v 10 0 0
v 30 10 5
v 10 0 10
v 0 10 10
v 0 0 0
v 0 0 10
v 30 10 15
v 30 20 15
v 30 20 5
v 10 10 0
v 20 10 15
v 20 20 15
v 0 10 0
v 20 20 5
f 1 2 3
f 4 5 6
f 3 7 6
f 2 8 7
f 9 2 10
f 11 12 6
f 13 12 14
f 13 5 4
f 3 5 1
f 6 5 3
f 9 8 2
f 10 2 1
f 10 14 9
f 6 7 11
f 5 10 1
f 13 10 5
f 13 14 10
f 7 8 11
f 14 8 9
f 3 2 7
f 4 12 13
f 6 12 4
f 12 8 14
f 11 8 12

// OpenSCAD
hull() {
  cube([10, 10, 10]);
  translate([20, 10, 5]) cube([10, 10, 10]);
}
